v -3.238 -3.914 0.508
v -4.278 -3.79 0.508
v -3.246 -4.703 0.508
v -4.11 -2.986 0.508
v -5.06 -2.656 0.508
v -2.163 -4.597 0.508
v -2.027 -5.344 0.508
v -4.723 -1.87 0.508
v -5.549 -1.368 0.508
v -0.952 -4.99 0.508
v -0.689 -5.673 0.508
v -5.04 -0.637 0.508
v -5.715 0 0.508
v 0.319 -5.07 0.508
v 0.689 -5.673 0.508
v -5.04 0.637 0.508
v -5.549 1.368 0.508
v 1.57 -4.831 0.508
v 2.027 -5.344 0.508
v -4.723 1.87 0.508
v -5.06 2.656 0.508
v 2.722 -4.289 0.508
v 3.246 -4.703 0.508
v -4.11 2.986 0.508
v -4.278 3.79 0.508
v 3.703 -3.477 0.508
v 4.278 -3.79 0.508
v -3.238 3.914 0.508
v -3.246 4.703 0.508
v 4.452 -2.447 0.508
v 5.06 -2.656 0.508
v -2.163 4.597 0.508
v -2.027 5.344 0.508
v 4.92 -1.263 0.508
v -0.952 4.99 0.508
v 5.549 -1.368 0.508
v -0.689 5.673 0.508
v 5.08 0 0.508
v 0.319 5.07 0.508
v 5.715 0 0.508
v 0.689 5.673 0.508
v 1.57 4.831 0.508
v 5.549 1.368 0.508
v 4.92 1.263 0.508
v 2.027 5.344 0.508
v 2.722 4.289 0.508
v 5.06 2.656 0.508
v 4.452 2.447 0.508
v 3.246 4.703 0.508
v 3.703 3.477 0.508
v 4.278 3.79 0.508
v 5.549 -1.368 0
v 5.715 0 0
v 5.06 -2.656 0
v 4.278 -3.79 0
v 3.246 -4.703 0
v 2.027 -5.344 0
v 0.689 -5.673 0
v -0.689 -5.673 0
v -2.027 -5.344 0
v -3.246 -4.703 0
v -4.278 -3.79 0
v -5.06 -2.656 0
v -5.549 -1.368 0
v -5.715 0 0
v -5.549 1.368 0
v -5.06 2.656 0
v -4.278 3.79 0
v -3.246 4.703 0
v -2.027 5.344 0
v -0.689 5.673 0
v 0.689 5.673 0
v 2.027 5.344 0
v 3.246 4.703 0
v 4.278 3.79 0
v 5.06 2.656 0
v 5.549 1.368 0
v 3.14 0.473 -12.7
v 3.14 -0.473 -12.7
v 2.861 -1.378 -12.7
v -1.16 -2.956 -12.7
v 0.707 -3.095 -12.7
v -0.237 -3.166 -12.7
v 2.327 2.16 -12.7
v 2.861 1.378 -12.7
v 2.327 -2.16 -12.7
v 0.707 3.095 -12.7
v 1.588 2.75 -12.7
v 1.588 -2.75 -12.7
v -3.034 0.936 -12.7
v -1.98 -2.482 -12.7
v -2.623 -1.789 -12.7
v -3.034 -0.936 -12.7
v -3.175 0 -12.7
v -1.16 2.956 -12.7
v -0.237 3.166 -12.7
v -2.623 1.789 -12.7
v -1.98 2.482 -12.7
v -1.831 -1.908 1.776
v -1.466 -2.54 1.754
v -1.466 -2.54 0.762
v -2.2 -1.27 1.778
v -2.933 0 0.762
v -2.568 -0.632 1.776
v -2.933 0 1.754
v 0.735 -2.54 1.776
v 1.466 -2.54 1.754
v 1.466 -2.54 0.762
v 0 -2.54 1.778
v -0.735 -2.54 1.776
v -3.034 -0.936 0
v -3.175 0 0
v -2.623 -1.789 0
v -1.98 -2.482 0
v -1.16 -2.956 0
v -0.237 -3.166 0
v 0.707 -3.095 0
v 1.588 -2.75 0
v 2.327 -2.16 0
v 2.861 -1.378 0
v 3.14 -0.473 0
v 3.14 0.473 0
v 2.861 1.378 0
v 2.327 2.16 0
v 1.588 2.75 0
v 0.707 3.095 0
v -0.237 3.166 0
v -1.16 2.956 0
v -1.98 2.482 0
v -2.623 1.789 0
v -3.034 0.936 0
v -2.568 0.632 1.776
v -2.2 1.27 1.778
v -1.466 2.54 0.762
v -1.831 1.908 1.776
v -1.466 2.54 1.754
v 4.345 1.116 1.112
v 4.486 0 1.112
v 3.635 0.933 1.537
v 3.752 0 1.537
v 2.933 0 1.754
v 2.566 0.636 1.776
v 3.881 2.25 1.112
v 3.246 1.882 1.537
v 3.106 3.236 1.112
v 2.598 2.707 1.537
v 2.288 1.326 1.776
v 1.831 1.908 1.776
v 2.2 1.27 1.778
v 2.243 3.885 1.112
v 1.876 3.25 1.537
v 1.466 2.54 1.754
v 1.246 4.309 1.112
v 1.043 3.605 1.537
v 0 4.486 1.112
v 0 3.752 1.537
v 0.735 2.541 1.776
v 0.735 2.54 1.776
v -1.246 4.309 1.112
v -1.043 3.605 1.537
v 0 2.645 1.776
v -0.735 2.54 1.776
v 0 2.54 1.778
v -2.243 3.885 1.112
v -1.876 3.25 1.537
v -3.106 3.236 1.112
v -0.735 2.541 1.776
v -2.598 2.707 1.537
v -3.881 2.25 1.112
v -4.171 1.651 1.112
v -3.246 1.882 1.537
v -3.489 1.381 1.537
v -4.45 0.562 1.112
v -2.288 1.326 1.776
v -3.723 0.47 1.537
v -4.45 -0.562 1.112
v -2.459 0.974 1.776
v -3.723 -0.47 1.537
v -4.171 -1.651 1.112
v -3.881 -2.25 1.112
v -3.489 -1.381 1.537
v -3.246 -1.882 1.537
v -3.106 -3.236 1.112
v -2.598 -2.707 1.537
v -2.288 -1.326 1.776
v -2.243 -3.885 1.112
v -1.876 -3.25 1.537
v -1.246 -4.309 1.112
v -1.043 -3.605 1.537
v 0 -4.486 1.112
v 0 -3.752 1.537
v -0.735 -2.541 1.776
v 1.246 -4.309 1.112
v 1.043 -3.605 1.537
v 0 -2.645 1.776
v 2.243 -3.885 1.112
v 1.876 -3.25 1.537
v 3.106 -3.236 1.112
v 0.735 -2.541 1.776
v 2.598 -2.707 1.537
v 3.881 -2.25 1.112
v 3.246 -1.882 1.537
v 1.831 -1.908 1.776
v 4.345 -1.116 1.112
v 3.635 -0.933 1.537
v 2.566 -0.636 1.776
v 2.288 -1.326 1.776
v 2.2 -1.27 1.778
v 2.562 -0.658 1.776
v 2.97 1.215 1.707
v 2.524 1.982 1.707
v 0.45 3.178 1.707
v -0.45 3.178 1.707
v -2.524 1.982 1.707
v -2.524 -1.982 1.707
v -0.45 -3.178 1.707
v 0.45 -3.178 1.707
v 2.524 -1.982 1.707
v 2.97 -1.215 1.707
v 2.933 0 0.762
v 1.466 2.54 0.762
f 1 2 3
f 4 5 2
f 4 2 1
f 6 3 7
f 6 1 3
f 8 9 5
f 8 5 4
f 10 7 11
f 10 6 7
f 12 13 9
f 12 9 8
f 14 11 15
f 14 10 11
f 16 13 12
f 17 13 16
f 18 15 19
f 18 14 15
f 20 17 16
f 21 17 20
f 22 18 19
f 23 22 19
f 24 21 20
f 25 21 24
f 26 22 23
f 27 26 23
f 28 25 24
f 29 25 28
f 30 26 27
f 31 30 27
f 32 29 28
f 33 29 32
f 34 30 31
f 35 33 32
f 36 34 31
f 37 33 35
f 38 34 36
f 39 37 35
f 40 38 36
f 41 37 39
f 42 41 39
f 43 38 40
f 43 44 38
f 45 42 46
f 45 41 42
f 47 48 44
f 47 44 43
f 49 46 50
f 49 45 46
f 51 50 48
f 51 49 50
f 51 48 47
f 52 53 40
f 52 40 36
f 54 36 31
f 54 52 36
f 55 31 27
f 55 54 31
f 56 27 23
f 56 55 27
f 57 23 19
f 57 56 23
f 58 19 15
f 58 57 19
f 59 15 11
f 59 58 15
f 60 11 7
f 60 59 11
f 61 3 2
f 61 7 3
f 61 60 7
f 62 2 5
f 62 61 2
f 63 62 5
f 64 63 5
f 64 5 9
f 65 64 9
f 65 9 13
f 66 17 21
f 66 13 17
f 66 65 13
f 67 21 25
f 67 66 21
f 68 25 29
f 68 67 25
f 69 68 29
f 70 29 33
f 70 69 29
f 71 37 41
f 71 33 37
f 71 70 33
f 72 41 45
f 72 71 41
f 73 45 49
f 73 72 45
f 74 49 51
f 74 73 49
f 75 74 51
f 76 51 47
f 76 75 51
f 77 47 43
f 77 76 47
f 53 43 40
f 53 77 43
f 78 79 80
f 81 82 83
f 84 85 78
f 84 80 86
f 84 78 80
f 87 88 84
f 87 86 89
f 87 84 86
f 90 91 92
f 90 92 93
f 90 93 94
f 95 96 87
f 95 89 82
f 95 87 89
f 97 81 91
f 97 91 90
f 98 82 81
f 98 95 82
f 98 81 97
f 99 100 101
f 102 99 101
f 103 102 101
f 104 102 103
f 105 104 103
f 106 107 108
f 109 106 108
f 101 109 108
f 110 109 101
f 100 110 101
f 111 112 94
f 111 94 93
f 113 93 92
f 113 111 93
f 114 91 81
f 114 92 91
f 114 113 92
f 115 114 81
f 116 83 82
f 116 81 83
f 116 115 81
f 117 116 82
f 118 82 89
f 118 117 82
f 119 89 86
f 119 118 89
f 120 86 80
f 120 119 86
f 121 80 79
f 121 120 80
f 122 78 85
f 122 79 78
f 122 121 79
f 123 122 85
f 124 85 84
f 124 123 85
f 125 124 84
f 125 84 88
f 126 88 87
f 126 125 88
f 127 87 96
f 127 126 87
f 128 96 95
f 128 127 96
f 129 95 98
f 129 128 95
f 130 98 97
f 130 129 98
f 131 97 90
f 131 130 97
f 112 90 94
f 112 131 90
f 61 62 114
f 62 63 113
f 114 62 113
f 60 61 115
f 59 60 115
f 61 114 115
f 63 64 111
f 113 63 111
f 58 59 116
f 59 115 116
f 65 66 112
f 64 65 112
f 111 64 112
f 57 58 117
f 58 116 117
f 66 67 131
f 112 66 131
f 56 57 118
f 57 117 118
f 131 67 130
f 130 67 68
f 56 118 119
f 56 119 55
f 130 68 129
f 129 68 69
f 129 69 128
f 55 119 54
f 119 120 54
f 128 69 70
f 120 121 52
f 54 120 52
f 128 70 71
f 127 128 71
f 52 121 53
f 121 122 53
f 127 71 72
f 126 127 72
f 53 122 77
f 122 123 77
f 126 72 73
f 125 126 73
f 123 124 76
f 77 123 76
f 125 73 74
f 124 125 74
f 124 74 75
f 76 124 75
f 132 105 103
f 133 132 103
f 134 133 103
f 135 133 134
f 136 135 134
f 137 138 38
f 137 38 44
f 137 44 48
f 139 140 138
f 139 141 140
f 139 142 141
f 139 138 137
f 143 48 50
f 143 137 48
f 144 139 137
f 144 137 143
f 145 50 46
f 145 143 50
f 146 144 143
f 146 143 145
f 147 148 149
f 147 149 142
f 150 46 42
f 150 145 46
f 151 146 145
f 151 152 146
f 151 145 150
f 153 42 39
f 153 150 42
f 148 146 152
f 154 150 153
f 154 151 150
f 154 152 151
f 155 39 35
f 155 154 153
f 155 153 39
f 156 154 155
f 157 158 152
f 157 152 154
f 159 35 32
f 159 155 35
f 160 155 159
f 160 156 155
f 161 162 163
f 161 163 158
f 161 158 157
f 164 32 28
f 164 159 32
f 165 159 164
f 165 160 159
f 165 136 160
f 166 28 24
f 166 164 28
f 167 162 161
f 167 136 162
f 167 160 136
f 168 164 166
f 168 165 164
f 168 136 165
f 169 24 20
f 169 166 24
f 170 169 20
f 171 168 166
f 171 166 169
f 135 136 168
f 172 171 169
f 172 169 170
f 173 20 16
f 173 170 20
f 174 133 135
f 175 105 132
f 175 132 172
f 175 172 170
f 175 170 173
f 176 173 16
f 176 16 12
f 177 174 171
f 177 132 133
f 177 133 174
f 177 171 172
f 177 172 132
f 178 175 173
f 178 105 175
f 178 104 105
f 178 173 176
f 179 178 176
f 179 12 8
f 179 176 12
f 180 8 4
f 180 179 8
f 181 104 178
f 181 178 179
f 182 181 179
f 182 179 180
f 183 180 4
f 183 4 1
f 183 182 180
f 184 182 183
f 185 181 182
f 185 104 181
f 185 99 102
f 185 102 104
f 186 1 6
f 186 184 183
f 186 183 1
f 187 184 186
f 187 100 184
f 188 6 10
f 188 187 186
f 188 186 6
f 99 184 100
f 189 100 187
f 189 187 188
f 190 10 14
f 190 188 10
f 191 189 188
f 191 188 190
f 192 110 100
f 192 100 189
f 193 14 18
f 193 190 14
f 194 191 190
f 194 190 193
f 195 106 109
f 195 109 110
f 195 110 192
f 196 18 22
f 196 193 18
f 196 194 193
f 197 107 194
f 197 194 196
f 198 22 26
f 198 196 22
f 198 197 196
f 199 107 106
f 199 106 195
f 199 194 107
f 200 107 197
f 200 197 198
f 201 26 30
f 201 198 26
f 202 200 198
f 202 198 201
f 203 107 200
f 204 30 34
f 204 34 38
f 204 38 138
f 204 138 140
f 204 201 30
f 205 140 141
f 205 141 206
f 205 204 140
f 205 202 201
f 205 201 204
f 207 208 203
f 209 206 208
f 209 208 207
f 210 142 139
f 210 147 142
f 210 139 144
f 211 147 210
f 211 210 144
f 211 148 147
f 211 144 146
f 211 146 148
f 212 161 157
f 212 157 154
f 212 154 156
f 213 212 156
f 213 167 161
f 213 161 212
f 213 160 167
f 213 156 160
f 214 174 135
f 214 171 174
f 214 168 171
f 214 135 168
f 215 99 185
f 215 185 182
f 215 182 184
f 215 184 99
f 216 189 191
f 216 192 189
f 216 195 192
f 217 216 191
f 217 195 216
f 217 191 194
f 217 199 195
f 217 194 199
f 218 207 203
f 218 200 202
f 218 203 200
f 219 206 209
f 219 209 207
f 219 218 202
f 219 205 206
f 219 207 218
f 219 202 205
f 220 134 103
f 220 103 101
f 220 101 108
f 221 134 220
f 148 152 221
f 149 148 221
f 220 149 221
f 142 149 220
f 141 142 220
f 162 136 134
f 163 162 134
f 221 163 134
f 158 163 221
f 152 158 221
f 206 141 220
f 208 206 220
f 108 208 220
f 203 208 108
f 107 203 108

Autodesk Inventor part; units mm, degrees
ref_plane "YZ Plane" through (0, 0, 0) normal (1, 0, 0) x (0, 1, 0)
ref_plane "XZ Plane" through (0, 0, 0) normal (0, 1, 0) x (-1, 0, 0)
ref_plane "XY Plane" through (0, 0, 0) normal (0, 0, 1) x (1, 0, 0)
sketch "Sketch1" plane through (0, 0, 0) normal (0, 0, 1) x (1, 0, 0)
  circle A0 centre (0, 0) radius 5.715
  dimension "d0" = 11.43
extrude "Extrusion1" add sketch "Sketch1" along normal blind 0.508
sketch "Sketch2" plane through (0, 0, 0.508) normal (0, 0, 1) x (1, 0, 0)
  circle A0 centre (0, 0) radius 5.715 projected
  circle A1 centre (0, 0) radius 5.08
  dimension "d3" = 10.16
extrude "Extrusion2" add sketch "Sketch2" along normal blind 1.27 contours A1
fillet "Fillet1" radius 3.175 1 edges at (-5.08, 0, 1.778)
sketch "Sketch3" plane through (0, 0, 1.778) normal (0, 0, 1) x (1, 0, 0)
  circle A0 centre (0, 0) radius 2.54 projected
  line L0 (2.9329, 0) -> (1.4665, -2.54)
  line L1 (1.4665, -2.54) -> (-1.4665, -2.54)
  line L2 (-1.4665, -2.54) -> (-2.9329, 0)
  line L3 (-2.9329, 0) -> (-1.4665, 2.54)
  line L4 (-1.4665, 2.54) -> (1.4665, 2.54)
  line L5 (1.4665, 2.54) -> (2.9329, 0)
  dimension "d7" = 2.54
extrude "Extrusion3" cut sketch "Sketch3" against normal blind 1.016
sketch "Sketch4" plane through (0, 0, 0) normal (0, 0, -1) x (-1, 0, 0)
  circle A0 centre (0, 0) radius 5.715 projected
  circle A1 centre (0, 0) radius 3.175
  dimension "d10" = 6.35
extrude "Extrusion4" add sketch "Sketch4" along normal blind 12.7 contours A1
thread "Thread1" size "1/4-20 UNC" class "2A" standard "ANSI Unified Screw Threads" full length
properties part number "8020_10series_0.5in_0.25-20_capscrews"
